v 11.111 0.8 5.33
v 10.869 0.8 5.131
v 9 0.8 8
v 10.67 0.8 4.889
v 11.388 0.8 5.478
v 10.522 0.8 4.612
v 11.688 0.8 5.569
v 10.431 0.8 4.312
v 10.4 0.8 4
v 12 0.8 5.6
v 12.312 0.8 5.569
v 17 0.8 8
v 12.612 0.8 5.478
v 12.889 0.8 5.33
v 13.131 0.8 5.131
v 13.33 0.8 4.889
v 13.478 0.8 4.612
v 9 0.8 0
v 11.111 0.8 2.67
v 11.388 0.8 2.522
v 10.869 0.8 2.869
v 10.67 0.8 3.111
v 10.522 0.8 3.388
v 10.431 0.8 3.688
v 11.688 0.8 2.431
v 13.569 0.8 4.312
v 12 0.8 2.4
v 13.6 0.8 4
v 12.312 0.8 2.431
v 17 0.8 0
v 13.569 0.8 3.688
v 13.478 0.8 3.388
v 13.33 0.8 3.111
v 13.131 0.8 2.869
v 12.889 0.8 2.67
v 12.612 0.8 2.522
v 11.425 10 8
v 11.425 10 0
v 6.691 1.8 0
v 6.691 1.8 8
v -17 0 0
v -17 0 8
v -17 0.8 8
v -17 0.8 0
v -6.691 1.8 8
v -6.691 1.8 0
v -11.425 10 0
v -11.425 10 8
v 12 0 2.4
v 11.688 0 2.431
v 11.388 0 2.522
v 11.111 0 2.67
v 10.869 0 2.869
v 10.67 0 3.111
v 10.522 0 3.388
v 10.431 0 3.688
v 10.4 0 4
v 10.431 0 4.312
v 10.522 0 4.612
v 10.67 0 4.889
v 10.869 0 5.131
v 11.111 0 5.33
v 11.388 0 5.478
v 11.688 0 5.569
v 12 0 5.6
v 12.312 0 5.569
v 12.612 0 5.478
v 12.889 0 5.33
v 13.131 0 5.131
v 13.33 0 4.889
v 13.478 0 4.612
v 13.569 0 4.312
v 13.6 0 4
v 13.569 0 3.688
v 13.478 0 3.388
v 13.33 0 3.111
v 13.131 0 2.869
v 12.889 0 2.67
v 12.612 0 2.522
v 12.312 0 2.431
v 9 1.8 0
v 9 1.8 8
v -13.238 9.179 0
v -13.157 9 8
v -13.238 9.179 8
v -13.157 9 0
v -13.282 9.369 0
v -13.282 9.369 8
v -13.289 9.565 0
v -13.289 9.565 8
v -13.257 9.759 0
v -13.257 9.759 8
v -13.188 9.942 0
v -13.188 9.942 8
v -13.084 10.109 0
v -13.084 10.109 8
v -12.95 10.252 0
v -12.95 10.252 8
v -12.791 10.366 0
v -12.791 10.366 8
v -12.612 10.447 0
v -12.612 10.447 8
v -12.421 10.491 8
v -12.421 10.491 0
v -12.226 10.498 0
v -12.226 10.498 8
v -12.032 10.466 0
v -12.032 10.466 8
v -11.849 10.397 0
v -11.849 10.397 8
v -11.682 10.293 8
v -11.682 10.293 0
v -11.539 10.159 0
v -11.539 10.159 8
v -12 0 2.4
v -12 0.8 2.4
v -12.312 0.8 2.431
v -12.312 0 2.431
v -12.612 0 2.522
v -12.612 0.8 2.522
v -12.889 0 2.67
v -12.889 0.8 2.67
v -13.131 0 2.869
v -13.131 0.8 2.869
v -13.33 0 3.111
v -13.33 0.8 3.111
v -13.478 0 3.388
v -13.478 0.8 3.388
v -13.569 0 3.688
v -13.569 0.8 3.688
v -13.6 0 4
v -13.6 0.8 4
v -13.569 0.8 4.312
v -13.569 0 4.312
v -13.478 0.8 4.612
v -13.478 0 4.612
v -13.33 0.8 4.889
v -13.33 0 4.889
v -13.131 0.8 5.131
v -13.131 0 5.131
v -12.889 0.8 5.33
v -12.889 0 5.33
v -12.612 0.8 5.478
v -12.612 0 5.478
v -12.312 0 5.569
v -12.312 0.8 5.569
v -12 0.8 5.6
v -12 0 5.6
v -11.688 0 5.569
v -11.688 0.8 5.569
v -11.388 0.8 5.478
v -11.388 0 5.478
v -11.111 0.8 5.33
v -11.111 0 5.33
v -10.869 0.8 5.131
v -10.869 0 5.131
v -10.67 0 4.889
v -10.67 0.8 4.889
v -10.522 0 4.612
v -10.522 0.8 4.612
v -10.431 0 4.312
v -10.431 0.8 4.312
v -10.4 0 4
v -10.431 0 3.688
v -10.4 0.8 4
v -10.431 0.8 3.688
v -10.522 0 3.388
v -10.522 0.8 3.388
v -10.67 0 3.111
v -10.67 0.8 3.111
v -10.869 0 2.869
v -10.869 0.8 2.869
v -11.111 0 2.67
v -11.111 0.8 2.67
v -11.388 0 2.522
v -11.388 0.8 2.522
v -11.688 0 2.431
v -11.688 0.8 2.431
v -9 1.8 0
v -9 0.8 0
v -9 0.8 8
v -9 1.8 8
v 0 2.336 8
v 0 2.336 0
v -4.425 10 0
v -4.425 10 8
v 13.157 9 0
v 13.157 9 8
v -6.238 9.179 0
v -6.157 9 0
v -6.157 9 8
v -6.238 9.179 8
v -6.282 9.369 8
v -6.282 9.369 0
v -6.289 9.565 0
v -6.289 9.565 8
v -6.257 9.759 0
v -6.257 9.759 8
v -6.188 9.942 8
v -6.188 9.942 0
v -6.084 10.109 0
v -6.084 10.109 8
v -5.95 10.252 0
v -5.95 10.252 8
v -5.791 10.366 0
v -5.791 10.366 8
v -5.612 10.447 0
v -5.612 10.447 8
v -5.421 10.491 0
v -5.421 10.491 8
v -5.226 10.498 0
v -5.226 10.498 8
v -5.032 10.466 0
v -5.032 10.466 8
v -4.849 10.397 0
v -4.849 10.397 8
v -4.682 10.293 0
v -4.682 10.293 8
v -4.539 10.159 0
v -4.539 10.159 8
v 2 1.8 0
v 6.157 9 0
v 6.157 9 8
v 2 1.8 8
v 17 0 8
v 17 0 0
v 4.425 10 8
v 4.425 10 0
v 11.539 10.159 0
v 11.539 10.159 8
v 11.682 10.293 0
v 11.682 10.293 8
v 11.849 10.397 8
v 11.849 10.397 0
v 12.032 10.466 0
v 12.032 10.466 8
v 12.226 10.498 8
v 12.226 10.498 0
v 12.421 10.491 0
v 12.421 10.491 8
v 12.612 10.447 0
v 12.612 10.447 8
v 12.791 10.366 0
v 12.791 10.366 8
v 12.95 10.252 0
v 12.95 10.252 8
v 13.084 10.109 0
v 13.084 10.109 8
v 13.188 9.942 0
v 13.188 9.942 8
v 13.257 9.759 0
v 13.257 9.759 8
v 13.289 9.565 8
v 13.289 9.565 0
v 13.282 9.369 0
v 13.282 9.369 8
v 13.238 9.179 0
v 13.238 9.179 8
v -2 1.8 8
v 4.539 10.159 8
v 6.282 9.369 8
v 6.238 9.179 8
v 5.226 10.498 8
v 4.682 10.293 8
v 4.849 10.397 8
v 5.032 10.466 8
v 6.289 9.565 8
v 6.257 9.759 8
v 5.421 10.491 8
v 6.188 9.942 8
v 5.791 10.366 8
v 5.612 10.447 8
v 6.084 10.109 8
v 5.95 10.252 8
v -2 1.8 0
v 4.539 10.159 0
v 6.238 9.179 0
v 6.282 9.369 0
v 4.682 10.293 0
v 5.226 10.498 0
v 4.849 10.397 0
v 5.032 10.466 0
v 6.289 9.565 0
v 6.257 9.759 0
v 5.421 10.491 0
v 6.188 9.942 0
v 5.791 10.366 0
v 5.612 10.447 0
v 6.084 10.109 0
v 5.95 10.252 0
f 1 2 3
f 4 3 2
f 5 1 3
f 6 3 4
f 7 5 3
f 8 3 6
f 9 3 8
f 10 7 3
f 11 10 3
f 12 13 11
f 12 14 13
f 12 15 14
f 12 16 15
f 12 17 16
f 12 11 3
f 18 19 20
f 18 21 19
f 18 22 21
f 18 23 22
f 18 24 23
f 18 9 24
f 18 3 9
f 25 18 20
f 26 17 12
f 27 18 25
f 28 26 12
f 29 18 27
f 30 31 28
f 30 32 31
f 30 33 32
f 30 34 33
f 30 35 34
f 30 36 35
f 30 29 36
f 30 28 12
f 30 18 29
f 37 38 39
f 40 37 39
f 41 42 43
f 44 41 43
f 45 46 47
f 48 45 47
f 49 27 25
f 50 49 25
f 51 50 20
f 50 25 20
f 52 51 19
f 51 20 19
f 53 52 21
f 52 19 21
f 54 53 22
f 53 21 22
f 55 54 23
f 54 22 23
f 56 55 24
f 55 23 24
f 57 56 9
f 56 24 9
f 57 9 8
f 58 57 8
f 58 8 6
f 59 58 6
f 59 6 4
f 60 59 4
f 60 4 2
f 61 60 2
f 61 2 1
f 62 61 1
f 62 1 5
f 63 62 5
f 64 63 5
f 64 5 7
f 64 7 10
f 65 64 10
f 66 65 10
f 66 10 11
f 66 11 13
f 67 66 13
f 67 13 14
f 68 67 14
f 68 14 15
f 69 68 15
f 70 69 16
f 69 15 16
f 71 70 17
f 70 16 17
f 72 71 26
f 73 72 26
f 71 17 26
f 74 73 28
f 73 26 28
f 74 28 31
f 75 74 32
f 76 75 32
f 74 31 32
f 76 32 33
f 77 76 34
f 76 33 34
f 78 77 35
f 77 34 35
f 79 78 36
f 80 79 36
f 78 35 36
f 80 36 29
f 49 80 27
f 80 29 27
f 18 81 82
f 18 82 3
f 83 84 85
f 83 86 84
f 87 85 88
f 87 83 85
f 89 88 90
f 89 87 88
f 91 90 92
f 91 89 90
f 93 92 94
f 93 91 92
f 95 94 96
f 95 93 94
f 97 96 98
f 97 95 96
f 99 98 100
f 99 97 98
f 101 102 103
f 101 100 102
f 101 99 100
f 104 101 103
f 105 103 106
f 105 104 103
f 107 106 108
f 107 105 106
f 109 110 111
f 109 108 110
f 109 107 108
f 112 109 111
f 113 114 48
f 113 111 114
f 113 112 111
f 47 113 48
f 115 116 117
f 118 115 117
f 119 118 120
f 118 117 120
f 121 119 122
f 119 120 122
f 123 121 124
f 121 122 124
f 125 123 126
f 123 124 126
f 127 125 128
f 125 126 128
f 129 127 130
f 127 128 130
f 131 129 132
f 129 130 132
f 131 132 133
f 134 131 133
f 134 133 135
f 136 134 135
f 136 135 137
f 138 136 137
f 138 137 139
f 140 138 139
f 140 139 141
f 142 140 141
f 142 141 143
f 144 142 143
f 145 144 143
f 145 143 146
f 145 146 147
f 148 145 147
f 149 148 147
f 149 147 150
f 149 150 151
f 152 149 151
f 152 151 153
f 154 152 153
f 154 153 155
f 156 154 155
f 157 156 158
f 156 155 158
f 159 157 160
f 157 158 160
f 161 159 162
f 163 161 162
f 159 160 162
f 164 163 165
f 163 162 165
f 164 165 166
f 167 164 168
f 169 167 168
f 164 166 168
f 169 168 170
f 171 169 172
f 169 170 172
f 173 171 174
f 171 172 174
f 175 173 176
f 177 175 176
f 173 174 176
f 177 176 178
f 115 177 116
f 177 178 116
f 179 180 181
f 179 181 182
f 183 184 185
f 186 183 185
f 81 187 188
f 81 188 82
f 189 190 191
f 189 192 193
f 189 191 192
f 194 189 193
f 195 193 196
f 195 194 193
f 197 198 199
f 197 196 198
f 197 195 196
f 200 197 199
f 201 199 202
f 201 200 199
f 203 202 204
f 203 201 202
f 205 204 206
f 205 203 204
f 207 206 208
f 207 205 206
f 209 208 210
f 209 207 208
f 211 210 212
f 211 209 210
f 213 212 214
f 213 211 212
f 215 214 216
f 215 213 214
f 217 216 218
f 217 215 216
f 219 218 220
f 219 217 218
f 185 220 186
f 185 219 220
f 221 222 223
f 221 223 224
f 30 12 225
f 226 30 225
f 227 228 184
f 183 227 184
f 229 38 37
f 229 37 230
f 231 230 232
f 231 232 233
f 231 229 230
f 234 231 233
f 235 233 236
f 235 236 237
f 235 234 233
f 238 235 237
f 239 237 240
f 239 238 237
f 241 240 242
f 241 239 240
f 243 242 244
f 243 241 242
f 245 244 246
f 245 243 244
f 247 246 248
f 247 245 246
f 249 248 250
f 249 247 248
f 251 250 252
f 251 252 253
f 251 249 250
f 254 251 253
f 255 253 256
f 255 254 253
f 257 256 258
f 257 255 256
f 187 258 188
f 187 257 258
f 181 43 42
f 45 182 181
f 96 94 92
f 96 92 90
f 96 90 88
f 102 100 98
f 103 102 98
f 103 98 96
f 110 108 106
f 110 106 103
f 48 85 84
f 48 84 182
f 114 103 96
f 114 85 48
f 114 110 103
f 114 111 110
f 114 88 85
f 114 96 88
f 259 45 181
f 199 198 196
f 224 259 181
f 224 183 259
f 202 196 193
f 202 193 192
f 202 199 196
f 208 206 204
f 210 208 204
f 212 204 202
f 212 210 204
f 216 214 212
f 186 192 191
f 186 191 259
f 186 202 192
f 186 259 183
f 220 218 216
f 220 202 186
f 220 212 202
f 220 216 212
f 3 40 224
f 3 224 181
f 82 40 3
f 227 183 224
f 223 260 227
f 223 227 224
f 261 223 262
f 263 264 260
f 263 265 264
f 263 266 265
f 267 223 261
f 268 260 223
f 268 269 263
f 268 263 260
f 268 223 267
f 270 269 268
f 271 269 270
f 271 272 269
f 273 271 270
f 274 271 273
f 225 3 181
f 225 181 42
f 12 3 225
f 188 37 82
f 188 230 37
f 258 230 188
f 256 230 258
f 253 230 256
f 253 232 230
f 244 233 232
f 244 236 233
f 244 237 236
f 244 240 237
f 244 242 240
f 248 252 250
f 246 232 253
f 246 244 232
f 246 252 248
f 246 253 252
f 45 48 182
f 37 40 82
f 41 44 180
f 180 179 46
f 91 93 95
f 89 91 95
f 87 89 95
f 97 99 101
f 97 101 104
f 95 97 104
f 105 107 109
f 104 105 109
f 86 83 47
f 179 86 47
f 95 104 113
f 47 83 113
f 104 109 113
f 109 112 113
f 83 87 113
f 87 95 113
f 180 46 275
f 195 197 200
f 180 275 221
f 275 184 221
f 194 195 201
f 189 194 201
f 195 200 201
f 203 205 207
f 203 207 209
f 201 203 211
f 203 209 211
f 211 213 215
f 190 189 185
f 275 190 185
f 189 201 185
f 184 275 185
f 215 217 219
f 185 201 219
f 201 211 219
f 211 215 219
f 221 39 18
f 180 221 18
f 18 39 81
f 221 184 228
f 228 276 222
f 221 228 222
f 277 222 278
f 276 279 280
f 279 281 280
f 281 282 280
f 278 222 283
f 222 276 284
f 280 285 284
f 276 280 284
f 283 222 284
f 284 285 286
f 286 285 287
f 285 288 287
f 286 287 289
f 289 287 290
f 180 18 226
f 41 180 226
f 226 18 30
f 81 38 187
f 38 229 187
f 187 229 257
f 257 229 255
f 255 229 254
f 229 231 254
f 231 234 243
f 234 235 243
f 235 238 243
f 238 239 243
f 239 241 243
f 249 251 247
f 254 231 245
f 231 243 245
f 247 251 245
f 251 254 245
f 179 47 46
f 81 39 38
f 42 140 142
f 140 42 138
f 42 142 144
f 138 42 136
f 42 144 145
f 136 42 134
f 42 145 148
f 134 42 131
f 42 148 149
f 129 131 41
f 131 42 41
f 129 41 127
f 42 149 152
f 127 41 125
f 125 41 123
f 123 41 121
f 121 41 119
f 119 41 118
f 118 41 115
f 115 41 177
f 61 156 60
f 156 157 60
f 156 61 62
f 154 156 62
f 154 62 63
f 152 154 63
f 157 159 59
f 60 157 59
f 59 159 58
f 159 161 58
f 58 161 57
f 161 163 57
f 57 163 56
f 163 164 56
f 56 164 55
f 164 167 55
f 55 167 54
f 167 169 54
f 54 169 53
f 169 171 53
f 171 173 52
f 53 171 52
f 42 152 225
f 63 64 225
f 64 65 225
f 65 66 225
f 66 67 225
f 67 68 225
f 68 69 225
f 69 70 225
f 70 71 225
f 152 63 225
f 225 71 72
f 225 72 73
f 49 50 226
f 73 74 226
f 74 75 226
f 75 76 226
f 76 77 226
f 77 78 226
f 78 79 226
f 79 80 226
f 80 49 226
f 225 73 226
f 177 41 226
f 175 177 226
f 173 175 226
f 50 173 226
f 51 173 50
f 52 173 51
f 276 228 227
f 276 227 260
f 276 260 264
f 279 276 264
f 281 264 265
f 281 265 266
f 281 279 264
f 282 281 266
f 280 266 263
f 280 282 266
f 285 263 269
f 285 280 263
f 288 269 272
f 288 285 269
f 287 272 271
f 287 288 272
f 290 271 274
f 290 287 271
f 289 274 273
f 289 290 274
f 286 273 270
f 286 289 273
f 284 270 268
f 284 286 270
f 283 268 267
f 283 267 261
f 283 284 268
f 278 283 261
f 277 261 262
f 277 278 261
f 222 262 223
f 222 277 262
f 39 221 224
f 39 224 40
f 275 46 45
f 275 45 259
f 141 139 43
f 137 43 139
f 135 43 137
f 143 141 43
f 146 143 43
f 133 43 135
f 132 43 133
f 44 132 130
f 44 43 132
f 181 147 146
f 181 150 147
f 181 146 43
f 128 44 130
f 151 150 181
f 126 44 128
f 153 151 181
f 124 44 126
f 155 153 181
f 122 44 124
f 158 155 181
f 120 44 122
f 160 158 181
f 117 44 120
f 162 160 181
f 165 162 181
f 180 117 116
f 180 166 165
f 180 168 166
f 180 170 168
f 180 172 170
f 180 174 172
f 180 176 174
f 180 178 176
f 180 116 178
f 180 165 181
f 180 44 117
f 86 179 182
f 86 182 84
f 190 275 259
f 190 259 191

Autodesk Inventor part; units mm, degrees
ref_plane "YZ Plane" through (0, 0, 0) normal (1, 0, 0) x (0, 1, 0)
ref_plane "XZ Plane" through (0, 0, 0) normal (0, 1, 0) x (-1, 0, 0)
ref_plane "XY Plane" through (0, 0, 0) normal (0, 0, 1) x (1, 0, 0)
sketch "Skizze1" plane through (0, 0, 0) normal (0, 0, 1) x (1, 0, 0)
  line L0 (-17, 0) -> (17, 0)
  line L1 (0, 2.16) -> (0, -0.36) projected
  line L2 (-17, 0) -> (-17, 0.8)
  line L3 (17, 0.8) -> (17, 0)
  line L4 (-17, 0.8) -> (-9, 0.8)
  line L5 (-9, 0.8) -> (-9, 1.8)
  line L6 (-9, 1.8) -> (9, 1.8)
  line L7 (9, 1.8) -> (9, 0.8)
  line L8 (9, 0.8) -> (17, 0.8)
  point P0 (0, 0)
  dimension "d2" = 0.8
  dimension "d3" = 34
  dimension "d28" = 1
  dimension "d29" = 18
extrude "Extrusion1" add sketch "Skizze1" along normal blind 8
sketch "Skizze2" plane through (0, 0, 0) normal (0, 0, 1) x (1, 0, 0)
  line L0 (-17, 0) -> (17, 0) construction
  line L1 (17, 0) -> (17, 0.8) construction
  line L2 (-9, 0.8) -> (-17, 0.8) construction
  line L3 (-17, 0.8) -> (-17, 0) construction
  line L4 (-9, 1.8) -> (-13.1569, 9)
  line L5 (-6.6906, 1.8) -> (-9, 1.8)
  line L6 (-6.6906, 1.8) -> (-11.4249, 10)
  arc A0 (-11.4249, 10) -> (-13.1569, 9) centre (-12.2909, 9.5) ccw
  line L7 (-17, 0.8) -> (-17, 0.8) construction
  line L8 (-17, 0.8) -> (-17, 10.5) construction
  line L9 (-17, 10.5) -> (17, 10.5) construction
  line L10 (17, 10.5) -> (17, 0.8) construction
  line L11 (17, 0.8) -> (-9, 0.8) construction
  line L12 (0, 13.8837) -> (0, -2.3139) construction
  arc A1 (-10.865, 10.5) -> (-17, 0.8) centre (-7.8453, 1.8) ccw construction
  line L13 (17, 0.8) -> (9, 0.8) projected
  line L14 (9, 0.8) -> (9, 1.8) projected
  line L15 (9, 1.8) -> (-9, 1.8) construction
  line L16 (-9, 1.8) -> (-9, 0.8) projected
  point P0 (0, 0)
  dimension "d10" = 2
  dimension "d11" = 60
  dimension "d12" = 34
  dimension "d14" = 10.5
extrude "Extrusion2" add sketch "Skizze2" along normal blind 8
pattern_linear "Rechteckige Anordnung1" count 2 spacing 7 along (1, 0, 0) of "Extrusion2"
mirror "Spiegeln1" about plane through (0, 0, 0) normal (1, 0, 0) of "Extrusion2", "Rechteckige Anordnung1"
sketch "Skizze3" plane through (-17, 0, 0) normal (0, -1, 0) x (1, 0, 0)
  line L0 (17, 9.6) -> (17, -1.6) projected
  line L1 (0, 0) -> (34, 0) projected
  line L2 (34, 0) -> (34, 8) projected
  line L3 (0, 8) -> (34, 8) projected
  line L4 (0, 0) -> (0, 8) projected
  line L5 (0, 0) -> (0, 8) construction
  line L6 (0, 4) -> (34, 4) construction
  point P0 (17, 0)
  point P1 (5, 4)
  point P2 (29, 4)
  dimension "d20" = 24
hole "Bohrung1" at (-12, 0, 4) at (12, 0, 4) direction (0, 1, 0) diameter 3.2 depth 2 tip angle 118
properties part number "Dribblerdaempfer V2" material "Gummi, Silikon"
